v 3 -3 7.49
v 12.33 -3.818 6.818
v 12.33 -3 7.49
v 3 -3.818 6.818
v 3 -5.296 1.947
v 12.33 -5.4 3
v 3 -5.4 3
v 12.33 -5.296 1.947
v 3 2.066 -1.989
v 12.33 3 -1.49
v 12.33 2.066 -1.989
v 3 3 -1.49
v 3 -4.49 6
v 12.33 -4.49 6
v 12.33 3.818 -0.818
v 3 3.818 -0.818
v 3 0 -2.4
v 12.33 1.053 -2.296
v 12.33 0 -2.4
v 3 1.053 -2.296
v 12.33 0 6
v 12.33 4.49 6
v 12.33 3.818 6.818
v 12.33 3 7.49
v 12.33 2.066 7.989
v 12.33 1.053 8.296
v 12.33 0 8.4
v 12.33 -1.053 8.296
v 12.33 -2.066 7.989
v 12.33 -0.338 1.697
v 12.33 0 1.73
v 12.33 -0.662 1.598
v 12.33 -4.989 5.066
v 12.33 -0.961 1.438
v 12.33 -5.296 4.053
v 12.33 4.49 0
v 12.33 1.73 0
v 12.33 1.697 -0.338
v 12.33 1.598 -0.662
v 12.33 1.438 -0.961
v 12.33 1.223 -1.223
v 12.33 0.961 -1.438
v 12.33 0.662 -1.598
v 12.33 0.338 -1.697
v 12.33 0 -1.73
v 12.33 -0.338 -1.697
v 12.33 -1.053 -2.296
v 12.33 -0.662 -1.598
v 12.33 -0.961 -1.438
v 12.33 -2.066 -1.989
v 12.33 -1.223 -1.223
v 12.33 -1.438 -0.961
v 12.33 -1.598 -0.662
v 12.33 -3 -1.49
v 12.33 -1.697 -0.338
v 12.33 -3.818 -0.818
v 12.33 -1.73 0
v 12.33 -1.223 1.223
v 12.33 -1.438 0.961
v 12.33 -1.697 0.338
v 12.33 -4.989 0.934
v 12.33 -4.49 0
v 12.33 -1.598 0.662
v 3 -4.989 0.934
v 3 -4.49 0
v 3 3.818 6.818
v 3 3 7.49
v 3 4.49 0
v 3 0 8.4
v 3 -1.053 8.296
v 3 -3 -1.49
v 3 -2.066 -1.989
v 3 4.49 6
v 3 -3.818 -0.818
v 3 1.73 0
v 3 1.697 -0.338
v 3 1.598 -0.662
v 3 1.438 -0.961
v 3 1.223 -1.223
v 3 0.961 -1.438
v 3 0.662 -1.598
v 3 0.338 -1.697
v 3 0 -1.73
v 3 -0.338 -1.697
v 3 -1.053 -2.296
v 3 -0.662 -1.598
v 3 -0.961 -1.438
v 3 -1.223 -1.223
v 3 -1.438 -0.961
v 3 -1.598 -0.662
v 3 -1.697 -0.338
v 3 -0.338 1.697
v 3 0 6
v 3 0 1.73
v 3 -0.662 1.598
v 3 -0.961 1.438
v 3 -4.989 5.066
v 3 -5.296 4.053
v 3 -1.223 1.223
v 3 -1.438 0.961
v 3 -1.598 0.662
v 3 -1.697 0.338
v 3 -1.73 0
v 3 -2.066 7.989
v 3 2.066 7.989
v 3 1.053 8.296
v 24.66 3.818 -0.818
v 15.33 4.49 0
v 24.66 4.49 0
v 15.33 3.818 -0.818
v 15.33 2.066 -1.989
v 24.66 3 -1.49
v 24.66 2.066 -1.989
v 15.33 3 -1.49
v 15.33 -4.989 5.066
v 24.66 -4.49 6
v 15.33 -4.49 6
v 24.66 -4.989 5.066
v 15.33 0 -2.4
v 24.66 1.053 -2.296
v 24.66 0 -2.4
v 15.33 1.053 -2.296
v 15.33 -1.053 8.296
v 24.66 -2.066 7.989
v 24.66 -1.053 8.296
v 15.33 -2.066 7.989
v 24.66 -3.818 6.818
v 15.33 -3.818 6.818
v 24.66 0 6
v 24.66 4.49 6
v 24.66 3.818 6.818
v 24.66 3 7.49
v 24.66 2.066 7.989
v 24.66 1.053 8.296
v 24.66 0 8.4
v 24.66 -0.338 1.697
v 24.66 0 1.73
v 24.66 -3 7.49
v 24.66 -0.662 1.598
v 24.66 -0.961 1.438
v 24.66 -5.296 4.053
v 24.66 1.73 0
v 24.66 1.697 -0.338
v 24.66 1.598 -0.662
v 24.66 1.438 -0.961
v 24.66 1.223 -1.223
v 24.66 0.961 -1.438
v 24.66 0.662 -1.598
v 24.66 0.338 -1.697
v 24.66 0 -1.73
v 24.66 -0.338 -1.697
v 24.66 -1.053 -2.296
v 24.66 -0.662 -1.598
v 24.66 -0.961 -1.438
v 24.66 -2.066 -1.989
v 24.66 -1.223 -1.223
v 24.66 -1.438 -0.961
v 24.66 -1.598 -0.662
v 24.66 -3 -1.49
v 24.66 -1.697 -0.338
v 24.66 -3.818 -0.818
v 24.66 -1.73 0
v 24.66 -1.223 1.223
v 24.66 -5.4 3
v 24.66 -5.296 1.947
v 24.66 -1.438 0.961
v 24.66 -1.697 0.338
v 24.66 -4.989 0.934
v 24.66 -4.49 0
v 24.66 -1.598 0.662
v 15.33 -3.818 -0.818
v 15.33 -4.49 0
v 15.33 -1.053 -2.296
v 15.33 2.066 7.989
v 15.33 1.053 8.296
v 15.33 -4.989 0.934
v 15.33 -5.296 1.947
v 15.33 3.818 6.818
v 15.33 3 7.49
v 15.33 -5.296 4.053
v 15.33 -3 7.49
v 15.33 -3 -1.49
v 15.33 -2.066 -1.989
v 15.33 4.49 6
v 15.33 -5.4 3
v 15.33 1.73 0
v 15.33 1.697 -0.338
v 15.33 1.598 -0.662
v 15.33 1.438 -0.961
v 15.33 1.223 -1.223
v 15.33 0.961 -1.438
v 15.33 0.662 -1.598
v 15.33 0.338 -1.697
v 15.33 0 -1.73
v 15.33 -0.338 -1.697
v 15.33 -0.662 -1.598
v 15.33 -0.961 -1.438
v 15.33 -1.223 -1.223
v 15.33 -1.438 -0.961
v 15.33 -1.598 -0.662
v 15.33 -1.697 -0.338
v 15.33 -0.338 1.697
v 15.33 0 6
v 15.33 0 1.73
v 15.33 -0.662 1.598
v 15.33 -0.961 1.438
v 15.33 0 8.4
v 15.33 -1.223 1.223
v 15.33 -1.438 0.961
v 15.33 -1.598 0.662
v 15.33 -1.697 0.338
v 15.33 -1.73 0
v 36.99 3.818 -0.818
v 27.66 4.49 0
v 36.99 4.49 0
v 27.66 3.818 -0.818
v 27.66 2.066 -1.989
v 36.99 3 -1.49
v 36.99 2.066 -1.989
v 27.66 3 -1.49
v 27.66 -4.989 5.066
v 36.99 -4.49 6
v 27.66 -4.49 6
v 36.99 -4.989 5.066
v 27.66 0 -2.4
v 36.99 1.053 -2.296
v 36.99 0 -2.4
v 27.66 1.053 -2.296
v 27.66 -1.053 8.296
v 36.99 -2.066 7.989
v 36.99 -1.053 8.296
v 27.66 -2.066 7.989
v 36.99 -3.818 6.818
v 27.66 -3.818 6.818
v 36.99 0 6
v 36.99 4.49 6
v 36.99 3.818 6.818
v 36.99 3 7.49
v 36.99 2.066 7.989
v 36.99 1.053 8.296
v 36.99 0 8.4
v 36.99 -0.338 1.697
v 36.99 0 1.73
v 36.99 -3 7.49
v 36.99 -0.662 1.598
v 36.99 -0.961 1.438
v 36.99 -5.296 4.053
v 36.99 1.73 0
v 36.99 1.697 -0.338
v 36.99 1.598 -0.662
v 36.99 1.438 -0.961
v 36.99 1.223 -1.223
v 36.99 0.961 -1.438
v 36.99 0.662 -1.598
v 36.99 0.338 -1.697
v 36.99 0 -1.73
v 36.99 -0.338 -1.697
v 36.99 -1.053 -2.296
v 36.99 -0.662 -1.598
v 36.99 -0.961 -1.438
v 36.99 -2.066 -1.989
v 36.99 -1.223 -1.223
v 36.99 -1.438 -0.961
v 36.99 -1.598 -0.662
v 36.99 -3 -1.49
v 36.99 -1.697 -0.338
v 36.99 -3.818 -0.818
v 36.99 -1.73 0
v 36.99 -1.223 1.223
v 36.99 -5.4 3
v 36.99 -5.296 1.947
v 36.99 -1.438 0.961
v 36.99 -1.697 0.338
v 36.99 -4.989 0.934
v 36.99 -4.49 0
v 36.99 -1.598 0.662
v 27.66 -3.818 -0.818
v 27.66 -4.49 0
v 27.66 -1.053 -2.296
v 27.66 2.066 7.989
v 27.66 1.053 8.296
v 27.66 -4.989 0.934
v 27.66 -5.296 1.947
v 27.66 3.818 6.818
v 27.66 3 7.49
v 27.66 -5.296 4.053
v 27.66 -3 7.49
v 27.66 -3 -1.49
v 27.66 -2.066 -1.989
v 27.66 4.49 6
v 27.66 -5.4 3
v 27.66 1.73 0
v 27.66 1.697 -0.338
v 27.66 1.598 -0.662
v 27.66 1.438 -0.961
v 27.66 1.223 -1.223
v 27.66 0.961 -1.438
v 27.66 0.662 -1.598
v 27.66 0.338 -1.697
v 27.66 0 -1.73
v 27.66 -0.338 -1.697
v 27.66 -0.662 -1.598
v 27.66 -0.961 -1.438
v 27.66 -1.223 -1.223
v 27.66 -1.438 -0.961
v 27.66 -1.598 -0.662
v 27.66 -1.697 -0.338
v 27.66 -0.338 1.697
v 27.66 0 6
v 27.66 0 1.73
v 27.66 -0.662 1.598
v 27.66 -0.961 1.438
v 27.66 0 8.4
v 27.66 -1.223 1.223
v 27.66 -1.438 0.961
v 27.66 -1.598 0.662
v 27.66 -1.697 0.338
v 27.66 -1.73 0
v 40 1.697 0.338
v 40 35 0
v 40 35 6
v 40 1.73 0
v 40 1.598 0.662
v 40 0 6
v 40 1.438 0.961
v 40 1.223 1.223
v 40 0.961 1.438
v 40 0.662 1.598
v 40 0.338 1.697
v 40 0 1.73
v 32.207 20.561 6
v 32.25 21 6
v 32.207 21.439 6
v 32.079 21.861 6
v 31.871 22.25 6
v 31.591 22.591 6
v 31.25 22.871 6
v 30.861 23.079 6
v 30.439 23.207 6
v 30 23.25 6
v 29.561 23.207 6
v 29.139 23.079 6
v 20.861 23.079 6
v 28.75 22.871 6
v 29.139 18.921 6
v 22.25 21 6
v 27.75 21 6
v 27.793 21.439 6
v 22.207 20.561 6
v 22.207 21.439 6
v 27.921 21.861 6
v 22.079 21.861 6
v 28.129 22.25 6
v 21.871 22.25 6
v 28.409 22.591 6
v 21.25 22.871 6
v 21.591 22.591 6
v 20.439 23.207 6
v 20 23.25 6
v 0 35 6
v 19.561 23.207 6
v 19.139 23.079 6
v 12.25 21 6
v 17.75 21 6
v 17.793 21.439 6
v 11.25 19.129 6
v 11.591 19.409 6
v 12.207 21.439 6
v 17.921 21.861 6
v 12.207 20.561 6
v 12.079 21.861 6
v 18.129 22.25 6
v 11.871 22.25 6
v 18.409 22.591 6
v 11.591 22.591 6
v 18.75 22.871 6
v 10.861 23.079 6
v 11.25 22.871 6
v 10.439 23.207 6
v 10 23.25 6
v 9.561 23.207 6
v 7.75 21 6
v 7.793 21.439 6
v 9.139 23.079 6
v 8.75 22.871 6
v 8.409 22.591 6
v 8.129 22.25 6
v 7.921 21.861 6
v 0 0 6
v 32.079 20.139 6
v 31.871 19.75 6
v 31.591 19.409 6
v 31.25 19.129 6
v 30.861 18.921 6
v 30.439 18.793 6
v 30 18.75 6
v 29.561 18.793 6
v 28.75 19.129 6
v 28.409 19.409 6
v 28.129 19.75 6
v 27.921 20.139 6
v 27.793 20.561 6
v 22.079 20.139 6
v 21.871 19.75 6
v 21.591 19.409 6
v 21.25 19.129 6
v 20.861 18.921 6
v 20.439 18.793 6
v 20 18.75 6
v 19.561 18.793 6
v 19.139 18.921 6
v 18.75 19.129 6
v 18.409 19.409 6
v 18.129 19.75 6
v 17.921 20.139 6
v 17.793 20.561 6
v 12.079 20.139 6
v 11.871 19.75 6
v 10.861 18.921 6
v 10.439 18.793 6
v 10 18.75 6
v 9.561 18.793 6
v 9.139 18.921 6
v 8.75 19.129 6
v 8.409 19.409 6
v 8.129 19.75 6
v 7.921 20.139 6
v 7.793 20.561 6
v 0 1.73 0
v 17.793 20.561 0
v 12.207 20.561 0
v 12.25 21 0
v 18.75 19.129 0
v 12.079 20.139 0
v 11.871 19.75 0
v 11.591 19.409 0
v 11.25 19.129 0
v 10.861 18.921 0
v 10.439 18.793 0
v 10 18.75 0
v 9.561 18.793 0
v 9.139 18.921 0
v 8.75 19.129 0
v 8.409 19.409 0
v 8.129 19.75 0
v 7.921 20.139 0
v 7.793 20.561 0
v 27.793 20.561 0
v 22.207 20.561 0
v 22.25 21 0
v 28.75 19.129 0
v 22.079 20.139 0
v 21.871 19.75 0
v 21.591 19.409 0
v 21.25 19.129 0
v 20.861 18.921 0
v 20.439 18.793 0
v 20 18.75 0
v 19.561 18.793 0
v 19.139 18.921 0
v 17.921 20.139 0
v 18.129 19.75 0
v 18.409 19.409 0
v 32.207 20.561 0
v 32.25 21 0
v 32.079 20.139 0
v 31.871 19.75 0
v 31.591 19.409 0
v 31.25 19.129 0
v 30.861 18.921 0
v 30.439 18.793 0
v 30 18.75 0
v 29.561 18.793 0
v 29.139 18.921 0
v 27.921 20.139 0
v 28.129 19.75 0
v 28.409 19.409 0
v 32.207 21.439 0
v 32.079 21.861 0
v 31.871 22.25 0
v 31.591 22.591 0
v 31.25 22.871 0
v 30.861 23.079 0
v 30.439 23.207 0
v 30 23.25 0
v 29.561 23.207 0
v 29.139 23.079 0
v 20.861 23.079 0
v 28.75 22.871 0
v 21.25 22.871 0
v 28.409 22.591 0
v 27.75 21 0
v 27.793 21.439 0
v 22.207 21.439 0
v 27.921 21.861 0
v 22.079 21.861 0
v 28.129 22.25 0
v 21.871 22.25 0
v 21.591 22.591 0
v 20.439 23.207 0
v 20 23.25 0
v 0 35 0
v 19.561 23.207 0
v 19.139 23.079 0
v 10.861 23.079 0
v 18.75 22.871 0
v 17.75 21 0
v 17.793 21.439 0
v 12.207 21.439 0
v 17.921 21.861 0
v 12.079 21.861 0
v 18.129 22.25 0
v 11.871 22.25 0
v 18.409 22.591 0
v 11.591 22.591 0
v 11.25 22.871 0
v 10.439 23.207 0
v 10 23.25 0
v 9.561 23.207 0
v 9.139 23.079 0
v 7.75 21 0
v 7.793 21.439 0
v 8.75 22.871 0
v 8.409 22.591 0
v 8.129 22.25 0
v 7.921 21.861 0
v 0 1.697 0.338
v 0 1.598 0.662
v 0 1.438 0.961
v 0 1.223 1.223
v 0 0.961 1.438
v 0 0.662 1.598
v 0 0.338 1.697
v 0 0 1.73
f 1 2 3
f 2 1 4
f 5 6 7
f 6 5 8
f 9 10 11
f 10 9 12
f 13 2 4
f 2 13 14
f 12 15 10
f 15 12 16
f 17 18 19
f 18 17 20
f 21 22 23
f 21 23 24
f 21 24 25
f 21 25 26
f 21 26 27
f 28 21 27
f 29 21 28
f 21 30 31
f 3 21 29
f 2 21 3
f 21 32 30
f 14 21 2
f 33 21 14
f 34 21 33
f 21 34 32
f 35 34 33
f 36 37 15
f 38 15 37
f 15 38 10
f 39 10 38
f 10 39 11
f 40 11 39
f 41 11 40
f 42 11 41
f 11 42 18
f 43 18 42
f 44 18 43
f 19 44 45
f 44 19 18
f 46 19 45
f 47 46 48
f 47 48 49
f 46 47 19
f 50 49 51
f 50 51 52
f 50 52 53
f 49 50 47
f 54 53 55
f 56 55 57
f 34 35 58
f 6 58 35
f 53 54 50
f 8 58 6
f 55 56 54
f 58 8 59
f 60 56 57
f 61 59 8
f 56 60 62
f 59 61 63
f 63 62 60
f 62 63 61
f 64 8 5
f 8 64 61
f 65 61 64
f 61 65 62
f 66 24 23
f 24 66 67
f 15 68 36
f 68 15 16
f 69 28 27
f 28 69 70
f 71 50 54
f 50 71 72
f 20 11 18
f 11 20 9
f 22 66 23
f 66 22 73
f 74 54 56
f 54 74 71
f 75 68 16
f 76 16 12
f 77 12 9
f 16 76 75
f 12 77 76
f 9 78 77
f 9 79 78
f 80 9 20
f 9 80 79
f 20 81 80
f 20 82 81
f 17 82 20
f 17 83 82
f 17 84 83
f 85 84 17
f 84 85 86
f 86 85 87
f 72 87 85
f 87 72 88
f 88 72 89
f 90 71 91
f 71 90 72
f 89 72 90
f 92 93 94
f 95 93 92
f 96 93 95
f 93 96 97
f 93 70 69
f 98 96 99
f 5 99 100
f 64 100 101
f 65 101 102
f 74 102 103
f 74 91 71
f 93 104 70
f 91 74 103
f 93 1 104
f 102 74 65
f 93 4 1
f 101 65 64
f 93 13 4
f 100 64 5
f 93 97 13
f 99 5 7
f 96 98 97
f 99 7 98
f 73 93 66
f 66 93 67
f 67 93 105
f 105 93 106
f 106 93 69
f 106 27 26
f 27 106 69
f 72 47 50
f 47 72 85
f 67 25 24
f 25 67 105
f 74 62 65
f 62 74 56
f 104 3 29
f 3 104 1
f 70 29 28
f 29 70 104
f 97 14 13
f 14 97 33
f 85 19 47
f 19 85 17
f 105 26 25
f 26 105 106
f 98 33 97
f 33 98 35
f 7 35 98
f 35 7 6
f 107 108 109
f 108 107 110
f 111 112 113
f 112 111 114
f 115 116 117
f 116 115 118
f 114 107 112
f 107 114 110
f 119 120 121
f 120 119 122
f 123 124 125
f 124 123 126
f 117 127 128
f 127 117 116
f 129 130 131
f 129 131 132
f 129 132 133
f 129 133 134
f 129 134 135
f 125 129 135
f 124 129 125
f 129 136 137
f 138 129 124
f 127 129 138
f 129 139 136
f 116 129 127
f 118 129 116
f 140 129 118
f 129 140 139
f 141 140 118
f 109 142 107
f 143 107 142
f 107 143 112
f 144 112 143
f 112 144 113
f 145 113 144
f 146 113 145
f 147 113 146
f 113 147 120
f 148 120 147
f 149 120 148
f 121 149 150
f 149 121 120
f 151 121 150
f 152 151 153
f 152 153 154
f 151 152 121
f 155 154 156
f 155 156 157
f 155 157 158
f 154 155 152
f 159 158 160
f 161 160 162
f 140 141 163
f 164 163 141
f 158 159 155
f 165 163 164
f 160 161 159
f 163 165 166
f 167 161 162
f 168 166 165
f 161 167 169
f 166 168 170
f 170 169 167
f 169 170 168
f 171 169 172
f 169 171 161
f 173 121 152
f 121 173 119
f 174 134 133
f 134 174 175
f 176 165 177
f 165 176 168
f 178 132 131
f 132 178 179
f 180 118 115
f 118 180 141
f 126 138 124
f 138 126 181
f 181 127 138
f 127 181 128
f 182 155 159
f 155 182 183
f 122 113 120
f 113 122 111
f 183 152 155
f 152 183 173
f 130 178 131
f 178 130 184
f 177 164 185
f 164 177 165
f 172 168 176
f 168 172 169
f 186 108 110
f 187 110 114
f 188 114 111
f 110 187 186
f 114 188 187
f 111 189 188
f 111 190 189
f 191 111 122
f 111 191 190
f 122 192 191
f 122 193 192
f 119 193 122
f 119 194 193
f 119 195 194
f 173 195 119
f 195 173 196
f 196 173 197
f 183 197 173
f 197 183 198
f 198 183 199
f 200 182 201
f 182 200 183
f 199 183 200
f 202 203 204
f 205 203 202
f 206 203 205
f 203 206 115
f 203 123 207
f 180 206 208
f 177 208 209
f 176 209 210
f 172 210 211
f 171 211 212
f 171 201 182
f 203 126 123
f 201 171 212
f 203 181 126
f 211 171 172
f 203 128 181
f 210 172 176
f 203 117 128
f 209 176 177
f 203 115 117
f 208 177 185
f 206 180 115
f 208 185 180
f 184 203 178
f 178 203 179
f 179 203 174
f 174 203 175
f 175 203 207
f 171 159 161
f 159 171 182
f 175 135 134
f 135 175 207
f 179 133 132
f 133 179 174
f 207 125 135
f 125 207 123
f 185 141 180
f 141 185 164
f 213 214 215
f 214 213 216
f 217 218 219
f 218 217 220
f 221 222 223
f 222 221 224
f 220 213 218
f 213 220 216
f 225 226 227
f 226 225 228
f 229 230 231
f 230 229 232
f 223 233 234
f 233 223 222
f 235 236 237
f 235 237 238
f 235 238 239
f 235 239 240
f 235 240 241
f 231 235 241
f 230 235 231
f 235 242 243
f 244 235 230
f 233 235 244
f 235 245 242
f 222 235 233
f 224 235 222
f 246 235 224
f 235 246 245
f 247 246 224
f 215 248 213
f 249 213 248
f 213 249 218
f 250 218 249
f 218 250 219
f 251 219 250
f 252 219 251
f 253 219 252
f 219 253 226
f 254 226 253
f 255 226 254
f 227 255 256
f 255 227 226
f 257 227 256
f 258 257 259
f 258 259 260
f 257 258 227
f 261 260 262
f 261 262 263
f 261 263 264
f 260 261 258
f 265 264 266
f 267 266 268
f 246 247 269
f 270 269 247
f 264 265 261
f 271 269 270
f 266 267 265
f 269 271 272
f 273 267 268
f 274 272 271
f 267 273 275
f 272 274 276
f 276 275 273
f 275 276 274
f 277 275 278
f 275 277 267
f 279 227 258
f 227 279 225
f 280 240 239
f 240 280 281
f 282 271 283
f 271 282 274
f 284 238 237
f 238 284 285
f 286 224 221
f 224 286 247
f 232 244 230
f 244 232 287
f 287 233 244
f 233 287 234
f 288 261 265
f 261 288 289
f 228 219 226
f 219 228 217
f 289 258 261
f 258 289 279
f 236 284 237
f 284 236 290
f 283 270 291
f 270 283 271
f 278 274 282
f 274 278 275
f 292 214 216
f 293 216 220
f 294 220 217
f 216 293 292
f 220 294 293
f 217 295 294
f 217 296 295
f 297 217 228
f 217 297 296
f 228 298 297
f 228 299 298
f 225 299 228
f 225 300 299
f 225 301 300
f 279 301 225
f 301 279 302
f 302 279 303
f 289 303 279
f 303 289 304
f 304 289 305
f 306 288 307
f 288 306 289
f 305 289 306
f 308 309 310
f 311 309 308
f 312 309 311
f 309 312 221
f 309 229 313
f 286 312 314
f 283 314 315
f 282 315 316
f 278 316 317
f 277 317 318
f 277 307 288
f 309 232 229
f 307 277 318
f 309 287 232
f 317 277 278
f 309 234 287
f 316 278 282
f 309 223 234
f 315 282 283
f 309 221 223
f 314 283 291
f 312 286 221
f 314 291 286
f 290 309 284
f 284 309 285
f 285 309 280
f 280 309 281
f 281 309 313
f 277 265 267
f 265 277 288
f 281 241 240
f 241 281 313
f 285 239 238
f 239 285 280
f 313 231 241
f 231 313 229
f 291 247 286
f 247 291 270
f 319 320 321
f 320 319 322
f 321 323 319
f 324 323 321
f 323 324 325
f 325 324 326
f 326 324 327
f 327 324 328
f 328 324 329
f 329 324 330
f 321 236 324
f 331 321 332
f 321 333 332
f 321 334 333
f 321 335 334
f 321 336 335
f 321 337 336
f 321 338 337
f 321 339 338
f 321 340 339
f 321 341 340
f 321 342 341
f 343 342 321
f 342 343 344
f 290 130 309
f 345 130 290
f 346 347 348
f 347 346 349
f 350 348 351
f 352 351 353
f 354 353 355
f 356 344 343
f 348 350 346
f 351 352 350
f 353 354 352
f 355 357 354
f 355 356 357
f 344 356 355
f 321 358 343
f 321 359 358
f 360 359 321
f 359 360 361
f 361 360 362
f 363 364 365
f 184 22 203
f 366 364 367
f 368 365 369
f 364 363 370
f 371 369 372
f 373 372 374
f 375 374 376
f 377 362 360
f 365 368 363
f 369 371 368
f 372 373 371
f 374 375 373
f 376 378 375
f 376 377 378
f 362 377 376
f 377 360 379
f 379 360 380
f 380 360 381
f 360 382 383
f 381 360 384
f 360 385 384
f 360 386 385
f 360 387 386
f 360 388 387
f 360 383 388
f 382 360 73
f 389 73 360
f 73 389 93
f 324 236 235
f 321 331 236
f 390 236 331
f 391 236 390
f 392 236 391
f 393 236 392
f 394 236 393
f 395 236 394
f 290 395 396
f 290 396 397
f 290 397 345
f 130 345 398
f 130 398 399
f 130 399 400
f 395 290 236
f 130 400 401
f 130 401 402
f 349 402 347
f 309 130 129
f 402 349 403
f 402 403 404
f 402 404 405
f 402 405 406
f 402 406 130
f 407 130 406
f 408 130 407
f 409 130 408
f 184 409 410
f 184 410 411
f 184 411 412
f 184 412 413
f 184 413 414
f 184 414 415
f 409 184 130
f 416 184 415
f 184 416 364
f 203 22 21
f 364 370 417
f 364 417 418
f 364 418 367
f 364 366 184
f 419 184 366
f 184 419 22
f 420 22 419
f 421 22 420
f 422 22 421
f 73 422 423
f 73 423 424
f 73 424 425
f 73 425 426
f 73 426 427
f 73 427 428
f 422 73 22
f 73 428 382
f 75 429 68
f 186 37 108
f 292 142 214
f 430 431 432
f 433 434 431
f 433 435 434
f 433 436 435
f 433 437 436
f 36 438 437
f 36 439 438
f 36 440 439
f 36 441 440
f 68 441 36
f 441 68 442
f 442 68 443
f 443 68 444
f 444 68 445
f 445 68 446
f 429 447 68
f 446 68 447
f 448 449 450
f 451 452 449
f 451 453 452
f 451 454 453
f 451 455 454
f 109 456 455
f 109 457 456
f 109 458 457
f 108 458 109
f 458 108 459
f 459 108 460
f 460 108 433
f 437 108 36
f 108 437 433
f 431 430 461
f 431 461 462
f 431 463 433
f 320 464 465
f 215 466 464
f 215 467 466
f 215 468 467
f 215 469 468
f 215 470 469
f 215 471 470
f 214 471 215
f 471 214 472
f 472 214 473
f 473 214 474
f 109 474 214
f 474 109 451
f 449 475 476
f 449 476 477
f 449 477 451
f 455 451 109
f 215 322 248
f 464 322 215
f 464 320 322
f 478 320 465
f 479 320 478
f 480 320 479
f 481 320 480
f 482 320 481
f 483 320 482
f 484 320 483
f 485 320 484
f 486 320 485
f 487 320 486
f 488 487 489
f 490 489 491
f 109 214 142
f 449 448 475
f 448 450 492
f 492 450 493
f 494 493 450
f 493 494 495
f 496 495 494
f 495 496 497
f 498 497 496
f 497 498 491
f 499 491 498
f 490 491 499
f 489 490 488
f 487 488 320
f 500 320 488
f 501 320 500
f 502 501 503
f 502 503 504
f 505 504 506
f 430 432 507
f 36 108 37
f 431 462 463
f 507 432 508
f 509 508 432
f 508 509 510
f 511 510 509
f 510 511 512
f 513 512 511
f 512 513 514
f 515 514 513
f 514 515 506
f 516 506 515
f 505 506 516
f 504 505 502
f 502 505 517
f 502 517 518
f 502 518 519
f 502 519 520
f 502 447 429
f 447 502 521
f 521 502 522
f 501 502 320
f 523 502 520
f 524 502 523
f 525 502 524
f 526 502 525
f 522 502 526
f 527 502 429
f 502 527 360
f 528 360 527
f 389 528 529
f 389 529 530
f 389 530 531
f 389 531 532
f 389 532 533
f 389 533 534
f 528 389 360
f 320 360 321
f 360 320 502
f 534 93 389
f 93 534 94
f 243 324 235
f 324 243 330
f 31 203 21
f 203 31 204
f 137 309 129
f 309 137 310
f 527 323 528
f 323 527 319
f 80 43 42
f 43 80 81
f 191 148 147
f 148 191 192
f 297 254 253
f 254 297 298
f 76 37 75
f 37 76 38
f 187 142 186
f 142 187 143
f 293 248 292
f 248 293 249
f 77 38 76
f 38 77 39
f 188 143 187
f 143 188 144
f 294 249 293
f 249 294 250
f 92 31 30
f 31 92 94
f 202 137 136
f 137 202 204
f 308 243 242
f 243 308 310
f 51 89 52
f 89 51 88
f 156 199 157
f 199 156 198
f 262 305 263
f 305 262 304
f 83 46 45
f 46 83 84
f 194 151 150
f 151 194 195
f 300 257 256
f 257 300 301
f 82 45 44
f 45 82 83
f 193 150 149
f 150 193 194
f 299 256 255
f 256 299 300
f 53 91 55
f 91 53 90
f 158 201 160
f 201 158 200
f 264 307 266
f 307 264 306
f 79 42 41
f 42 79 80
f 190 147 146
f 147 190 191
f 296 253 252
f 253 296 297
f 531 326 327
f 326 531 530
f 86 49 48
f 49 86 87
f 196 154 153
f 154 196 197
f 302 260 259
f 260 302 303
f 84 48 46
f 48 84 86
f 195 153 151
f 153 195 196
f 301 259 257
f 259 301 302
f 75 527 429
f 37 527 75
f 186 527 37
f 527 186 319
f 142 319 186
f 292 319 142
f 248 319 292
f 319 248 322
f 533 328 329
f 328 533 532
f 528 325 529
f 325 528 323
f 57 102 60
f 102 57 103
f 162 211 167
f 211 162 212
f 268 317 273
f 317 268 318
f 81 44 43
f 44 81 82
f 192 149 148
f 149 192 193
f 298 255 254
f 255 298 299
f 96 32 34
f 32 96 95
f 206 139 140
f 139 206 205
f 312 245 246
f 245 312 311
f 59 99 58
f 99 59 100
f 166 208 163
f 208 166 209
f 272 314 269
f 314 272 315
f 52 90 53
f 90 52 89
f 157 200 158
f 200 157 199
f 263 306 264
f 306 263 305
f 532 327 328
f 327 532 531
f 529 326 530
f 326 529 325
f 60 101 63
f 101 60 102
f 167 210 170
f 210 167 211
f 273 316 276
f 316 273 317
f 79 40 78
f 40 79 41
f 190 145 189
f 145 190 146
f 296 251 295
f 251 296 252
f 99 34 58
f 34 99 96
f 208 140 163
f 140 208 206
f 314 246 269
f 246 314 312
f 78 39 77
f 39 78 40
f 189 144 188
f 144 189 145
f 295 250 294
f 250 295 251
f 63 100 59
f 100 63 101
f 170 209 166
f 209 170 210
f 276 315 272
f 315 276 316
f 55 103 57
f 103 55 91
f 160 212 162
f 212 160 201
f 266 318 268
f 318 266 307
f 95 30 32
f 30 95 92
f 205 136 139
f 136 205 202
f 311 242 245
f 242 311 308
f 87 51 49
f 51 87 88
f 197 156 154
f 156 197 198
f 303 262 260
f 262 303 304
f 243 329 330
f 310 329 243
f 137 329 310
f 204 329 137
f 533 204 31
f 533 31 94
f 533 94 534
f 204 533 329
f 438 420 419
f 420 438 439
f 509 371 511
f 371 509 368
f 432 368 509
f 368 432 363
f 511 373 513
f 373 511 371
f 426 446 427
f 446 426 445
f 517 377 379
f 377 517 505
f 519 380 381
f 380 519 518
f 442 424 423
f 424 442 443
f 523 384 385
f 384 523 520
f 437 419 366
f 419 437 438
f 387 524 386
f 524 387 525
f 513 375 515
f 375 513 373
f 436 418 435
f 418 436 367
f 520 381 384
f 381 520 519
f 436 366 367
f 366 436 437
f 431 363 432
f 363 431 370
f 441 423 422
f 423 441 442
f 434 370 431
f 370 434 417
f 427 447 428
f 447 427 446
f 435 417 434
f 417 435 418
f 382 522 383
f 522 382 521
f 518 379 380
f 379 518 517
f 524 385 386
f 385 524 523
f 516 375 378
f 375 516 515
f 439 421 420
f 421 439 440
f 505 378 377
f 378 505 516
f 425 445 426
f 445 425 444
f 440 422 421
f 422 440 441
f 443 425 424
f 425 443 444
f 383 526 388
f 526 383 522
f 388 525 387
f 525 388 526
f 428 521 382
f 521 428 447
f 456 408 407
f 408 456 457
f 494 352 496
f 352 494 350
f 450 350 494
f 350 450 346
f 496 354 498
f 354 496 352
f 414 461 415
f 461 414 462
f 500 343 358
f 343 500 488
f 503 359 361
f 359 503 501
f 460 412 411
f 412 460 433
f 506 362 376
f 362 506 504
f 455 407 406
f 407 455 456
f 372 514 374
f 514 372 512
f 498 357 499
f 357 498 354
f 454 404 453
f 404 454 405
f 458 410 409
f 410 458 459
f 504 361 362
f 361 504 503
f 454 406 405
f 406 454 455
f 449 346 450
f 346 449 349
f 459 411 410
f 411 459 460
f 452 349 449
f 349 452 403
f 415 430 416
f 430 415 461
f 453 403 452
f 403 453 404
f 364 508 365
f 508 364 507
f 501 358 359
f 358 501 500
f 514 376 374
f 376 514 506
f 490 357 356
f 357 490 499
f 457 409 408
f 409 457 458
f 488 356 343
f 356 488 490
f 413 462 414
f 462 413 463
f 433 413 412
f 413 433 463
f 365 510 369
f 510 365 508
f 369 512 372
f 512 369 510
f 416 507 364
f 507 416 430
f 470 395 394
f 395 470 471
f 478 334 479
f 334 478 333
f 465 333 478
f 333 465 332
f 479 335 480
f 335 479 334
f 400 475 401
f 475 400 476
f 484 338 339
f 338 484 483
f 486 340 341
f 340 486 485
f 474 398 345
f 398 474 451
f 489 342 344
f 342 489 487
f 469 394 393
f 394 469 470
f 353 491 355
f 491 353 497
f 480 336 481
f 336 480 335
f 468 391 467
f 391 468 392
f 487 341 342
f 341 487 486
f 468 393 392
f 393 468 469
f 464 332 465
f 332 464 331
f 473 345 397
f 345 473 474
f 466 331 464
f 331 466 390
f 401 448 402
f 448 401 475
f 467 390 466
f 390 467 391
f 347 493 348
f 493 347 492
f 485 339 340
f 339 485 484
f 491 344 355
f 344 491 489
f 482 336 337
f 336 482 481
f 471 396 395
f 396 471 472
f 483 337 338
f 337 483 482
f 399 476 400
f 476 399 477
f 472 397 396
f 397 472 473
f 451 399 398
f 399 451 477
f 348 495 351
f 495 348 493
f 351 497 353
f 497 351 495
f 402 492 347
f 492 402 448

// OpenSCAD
$fn = 32;

// ----------------------------------------------------------------------
// Hinge leaf: 40 x 40.4 x 10.8 mm
// ----------------------------------------------------------------------

// --- parameters (mm) ---
leaf_len = 40;            // leaf length, X
leaf_w = 35;              // leaf width, Y
leaf_t = 6;               // leaf thickness
knuckle_d = 10.8;         // knuckle diameter
knuckle_w = 9.33;         // knuckle width
knuckle_n = 3;            // number of knuckles
pin_d = 3.46;             // pin bore
gap = 3;                  // gap between the knuckles
screw_d = 4.5;            // screw clearance

module leaf() {
  cube([leaf_len, leaf_w, leaf_t]);
}

module knuckles() {
  /* barrels sit on the leaf edge, the pin axis at half the leaf thickness */
  for (i = [0 : knuckle_n - 1])
    translate([gap + i * (knuckle_w + gap), 0, leaf_t * 0.5])
      rotate([0, 90, 0]) cylinder(h = knuckle_w, d = knuckle_d);
}

difference() {
  union() {
    leaf();
    knuckles();
  }
  rotate([0, 90, 0]) translate([0, 0, -1])
    cylinder(h = leaf_len + 2, d = pin_d);
  translate([10, leaf_w * 0.6, -1]) cylinder(h = leaf_t + 2, d = screw_d);
  translate([20, leaf_w * 0.6, -1]) cylinder(h = leaf_t + 2, d = screw_d);
  translate([30, leaf_w * 0.6, -1]) cylinder(h = leaf_t + 2, d = screw_d);
}
